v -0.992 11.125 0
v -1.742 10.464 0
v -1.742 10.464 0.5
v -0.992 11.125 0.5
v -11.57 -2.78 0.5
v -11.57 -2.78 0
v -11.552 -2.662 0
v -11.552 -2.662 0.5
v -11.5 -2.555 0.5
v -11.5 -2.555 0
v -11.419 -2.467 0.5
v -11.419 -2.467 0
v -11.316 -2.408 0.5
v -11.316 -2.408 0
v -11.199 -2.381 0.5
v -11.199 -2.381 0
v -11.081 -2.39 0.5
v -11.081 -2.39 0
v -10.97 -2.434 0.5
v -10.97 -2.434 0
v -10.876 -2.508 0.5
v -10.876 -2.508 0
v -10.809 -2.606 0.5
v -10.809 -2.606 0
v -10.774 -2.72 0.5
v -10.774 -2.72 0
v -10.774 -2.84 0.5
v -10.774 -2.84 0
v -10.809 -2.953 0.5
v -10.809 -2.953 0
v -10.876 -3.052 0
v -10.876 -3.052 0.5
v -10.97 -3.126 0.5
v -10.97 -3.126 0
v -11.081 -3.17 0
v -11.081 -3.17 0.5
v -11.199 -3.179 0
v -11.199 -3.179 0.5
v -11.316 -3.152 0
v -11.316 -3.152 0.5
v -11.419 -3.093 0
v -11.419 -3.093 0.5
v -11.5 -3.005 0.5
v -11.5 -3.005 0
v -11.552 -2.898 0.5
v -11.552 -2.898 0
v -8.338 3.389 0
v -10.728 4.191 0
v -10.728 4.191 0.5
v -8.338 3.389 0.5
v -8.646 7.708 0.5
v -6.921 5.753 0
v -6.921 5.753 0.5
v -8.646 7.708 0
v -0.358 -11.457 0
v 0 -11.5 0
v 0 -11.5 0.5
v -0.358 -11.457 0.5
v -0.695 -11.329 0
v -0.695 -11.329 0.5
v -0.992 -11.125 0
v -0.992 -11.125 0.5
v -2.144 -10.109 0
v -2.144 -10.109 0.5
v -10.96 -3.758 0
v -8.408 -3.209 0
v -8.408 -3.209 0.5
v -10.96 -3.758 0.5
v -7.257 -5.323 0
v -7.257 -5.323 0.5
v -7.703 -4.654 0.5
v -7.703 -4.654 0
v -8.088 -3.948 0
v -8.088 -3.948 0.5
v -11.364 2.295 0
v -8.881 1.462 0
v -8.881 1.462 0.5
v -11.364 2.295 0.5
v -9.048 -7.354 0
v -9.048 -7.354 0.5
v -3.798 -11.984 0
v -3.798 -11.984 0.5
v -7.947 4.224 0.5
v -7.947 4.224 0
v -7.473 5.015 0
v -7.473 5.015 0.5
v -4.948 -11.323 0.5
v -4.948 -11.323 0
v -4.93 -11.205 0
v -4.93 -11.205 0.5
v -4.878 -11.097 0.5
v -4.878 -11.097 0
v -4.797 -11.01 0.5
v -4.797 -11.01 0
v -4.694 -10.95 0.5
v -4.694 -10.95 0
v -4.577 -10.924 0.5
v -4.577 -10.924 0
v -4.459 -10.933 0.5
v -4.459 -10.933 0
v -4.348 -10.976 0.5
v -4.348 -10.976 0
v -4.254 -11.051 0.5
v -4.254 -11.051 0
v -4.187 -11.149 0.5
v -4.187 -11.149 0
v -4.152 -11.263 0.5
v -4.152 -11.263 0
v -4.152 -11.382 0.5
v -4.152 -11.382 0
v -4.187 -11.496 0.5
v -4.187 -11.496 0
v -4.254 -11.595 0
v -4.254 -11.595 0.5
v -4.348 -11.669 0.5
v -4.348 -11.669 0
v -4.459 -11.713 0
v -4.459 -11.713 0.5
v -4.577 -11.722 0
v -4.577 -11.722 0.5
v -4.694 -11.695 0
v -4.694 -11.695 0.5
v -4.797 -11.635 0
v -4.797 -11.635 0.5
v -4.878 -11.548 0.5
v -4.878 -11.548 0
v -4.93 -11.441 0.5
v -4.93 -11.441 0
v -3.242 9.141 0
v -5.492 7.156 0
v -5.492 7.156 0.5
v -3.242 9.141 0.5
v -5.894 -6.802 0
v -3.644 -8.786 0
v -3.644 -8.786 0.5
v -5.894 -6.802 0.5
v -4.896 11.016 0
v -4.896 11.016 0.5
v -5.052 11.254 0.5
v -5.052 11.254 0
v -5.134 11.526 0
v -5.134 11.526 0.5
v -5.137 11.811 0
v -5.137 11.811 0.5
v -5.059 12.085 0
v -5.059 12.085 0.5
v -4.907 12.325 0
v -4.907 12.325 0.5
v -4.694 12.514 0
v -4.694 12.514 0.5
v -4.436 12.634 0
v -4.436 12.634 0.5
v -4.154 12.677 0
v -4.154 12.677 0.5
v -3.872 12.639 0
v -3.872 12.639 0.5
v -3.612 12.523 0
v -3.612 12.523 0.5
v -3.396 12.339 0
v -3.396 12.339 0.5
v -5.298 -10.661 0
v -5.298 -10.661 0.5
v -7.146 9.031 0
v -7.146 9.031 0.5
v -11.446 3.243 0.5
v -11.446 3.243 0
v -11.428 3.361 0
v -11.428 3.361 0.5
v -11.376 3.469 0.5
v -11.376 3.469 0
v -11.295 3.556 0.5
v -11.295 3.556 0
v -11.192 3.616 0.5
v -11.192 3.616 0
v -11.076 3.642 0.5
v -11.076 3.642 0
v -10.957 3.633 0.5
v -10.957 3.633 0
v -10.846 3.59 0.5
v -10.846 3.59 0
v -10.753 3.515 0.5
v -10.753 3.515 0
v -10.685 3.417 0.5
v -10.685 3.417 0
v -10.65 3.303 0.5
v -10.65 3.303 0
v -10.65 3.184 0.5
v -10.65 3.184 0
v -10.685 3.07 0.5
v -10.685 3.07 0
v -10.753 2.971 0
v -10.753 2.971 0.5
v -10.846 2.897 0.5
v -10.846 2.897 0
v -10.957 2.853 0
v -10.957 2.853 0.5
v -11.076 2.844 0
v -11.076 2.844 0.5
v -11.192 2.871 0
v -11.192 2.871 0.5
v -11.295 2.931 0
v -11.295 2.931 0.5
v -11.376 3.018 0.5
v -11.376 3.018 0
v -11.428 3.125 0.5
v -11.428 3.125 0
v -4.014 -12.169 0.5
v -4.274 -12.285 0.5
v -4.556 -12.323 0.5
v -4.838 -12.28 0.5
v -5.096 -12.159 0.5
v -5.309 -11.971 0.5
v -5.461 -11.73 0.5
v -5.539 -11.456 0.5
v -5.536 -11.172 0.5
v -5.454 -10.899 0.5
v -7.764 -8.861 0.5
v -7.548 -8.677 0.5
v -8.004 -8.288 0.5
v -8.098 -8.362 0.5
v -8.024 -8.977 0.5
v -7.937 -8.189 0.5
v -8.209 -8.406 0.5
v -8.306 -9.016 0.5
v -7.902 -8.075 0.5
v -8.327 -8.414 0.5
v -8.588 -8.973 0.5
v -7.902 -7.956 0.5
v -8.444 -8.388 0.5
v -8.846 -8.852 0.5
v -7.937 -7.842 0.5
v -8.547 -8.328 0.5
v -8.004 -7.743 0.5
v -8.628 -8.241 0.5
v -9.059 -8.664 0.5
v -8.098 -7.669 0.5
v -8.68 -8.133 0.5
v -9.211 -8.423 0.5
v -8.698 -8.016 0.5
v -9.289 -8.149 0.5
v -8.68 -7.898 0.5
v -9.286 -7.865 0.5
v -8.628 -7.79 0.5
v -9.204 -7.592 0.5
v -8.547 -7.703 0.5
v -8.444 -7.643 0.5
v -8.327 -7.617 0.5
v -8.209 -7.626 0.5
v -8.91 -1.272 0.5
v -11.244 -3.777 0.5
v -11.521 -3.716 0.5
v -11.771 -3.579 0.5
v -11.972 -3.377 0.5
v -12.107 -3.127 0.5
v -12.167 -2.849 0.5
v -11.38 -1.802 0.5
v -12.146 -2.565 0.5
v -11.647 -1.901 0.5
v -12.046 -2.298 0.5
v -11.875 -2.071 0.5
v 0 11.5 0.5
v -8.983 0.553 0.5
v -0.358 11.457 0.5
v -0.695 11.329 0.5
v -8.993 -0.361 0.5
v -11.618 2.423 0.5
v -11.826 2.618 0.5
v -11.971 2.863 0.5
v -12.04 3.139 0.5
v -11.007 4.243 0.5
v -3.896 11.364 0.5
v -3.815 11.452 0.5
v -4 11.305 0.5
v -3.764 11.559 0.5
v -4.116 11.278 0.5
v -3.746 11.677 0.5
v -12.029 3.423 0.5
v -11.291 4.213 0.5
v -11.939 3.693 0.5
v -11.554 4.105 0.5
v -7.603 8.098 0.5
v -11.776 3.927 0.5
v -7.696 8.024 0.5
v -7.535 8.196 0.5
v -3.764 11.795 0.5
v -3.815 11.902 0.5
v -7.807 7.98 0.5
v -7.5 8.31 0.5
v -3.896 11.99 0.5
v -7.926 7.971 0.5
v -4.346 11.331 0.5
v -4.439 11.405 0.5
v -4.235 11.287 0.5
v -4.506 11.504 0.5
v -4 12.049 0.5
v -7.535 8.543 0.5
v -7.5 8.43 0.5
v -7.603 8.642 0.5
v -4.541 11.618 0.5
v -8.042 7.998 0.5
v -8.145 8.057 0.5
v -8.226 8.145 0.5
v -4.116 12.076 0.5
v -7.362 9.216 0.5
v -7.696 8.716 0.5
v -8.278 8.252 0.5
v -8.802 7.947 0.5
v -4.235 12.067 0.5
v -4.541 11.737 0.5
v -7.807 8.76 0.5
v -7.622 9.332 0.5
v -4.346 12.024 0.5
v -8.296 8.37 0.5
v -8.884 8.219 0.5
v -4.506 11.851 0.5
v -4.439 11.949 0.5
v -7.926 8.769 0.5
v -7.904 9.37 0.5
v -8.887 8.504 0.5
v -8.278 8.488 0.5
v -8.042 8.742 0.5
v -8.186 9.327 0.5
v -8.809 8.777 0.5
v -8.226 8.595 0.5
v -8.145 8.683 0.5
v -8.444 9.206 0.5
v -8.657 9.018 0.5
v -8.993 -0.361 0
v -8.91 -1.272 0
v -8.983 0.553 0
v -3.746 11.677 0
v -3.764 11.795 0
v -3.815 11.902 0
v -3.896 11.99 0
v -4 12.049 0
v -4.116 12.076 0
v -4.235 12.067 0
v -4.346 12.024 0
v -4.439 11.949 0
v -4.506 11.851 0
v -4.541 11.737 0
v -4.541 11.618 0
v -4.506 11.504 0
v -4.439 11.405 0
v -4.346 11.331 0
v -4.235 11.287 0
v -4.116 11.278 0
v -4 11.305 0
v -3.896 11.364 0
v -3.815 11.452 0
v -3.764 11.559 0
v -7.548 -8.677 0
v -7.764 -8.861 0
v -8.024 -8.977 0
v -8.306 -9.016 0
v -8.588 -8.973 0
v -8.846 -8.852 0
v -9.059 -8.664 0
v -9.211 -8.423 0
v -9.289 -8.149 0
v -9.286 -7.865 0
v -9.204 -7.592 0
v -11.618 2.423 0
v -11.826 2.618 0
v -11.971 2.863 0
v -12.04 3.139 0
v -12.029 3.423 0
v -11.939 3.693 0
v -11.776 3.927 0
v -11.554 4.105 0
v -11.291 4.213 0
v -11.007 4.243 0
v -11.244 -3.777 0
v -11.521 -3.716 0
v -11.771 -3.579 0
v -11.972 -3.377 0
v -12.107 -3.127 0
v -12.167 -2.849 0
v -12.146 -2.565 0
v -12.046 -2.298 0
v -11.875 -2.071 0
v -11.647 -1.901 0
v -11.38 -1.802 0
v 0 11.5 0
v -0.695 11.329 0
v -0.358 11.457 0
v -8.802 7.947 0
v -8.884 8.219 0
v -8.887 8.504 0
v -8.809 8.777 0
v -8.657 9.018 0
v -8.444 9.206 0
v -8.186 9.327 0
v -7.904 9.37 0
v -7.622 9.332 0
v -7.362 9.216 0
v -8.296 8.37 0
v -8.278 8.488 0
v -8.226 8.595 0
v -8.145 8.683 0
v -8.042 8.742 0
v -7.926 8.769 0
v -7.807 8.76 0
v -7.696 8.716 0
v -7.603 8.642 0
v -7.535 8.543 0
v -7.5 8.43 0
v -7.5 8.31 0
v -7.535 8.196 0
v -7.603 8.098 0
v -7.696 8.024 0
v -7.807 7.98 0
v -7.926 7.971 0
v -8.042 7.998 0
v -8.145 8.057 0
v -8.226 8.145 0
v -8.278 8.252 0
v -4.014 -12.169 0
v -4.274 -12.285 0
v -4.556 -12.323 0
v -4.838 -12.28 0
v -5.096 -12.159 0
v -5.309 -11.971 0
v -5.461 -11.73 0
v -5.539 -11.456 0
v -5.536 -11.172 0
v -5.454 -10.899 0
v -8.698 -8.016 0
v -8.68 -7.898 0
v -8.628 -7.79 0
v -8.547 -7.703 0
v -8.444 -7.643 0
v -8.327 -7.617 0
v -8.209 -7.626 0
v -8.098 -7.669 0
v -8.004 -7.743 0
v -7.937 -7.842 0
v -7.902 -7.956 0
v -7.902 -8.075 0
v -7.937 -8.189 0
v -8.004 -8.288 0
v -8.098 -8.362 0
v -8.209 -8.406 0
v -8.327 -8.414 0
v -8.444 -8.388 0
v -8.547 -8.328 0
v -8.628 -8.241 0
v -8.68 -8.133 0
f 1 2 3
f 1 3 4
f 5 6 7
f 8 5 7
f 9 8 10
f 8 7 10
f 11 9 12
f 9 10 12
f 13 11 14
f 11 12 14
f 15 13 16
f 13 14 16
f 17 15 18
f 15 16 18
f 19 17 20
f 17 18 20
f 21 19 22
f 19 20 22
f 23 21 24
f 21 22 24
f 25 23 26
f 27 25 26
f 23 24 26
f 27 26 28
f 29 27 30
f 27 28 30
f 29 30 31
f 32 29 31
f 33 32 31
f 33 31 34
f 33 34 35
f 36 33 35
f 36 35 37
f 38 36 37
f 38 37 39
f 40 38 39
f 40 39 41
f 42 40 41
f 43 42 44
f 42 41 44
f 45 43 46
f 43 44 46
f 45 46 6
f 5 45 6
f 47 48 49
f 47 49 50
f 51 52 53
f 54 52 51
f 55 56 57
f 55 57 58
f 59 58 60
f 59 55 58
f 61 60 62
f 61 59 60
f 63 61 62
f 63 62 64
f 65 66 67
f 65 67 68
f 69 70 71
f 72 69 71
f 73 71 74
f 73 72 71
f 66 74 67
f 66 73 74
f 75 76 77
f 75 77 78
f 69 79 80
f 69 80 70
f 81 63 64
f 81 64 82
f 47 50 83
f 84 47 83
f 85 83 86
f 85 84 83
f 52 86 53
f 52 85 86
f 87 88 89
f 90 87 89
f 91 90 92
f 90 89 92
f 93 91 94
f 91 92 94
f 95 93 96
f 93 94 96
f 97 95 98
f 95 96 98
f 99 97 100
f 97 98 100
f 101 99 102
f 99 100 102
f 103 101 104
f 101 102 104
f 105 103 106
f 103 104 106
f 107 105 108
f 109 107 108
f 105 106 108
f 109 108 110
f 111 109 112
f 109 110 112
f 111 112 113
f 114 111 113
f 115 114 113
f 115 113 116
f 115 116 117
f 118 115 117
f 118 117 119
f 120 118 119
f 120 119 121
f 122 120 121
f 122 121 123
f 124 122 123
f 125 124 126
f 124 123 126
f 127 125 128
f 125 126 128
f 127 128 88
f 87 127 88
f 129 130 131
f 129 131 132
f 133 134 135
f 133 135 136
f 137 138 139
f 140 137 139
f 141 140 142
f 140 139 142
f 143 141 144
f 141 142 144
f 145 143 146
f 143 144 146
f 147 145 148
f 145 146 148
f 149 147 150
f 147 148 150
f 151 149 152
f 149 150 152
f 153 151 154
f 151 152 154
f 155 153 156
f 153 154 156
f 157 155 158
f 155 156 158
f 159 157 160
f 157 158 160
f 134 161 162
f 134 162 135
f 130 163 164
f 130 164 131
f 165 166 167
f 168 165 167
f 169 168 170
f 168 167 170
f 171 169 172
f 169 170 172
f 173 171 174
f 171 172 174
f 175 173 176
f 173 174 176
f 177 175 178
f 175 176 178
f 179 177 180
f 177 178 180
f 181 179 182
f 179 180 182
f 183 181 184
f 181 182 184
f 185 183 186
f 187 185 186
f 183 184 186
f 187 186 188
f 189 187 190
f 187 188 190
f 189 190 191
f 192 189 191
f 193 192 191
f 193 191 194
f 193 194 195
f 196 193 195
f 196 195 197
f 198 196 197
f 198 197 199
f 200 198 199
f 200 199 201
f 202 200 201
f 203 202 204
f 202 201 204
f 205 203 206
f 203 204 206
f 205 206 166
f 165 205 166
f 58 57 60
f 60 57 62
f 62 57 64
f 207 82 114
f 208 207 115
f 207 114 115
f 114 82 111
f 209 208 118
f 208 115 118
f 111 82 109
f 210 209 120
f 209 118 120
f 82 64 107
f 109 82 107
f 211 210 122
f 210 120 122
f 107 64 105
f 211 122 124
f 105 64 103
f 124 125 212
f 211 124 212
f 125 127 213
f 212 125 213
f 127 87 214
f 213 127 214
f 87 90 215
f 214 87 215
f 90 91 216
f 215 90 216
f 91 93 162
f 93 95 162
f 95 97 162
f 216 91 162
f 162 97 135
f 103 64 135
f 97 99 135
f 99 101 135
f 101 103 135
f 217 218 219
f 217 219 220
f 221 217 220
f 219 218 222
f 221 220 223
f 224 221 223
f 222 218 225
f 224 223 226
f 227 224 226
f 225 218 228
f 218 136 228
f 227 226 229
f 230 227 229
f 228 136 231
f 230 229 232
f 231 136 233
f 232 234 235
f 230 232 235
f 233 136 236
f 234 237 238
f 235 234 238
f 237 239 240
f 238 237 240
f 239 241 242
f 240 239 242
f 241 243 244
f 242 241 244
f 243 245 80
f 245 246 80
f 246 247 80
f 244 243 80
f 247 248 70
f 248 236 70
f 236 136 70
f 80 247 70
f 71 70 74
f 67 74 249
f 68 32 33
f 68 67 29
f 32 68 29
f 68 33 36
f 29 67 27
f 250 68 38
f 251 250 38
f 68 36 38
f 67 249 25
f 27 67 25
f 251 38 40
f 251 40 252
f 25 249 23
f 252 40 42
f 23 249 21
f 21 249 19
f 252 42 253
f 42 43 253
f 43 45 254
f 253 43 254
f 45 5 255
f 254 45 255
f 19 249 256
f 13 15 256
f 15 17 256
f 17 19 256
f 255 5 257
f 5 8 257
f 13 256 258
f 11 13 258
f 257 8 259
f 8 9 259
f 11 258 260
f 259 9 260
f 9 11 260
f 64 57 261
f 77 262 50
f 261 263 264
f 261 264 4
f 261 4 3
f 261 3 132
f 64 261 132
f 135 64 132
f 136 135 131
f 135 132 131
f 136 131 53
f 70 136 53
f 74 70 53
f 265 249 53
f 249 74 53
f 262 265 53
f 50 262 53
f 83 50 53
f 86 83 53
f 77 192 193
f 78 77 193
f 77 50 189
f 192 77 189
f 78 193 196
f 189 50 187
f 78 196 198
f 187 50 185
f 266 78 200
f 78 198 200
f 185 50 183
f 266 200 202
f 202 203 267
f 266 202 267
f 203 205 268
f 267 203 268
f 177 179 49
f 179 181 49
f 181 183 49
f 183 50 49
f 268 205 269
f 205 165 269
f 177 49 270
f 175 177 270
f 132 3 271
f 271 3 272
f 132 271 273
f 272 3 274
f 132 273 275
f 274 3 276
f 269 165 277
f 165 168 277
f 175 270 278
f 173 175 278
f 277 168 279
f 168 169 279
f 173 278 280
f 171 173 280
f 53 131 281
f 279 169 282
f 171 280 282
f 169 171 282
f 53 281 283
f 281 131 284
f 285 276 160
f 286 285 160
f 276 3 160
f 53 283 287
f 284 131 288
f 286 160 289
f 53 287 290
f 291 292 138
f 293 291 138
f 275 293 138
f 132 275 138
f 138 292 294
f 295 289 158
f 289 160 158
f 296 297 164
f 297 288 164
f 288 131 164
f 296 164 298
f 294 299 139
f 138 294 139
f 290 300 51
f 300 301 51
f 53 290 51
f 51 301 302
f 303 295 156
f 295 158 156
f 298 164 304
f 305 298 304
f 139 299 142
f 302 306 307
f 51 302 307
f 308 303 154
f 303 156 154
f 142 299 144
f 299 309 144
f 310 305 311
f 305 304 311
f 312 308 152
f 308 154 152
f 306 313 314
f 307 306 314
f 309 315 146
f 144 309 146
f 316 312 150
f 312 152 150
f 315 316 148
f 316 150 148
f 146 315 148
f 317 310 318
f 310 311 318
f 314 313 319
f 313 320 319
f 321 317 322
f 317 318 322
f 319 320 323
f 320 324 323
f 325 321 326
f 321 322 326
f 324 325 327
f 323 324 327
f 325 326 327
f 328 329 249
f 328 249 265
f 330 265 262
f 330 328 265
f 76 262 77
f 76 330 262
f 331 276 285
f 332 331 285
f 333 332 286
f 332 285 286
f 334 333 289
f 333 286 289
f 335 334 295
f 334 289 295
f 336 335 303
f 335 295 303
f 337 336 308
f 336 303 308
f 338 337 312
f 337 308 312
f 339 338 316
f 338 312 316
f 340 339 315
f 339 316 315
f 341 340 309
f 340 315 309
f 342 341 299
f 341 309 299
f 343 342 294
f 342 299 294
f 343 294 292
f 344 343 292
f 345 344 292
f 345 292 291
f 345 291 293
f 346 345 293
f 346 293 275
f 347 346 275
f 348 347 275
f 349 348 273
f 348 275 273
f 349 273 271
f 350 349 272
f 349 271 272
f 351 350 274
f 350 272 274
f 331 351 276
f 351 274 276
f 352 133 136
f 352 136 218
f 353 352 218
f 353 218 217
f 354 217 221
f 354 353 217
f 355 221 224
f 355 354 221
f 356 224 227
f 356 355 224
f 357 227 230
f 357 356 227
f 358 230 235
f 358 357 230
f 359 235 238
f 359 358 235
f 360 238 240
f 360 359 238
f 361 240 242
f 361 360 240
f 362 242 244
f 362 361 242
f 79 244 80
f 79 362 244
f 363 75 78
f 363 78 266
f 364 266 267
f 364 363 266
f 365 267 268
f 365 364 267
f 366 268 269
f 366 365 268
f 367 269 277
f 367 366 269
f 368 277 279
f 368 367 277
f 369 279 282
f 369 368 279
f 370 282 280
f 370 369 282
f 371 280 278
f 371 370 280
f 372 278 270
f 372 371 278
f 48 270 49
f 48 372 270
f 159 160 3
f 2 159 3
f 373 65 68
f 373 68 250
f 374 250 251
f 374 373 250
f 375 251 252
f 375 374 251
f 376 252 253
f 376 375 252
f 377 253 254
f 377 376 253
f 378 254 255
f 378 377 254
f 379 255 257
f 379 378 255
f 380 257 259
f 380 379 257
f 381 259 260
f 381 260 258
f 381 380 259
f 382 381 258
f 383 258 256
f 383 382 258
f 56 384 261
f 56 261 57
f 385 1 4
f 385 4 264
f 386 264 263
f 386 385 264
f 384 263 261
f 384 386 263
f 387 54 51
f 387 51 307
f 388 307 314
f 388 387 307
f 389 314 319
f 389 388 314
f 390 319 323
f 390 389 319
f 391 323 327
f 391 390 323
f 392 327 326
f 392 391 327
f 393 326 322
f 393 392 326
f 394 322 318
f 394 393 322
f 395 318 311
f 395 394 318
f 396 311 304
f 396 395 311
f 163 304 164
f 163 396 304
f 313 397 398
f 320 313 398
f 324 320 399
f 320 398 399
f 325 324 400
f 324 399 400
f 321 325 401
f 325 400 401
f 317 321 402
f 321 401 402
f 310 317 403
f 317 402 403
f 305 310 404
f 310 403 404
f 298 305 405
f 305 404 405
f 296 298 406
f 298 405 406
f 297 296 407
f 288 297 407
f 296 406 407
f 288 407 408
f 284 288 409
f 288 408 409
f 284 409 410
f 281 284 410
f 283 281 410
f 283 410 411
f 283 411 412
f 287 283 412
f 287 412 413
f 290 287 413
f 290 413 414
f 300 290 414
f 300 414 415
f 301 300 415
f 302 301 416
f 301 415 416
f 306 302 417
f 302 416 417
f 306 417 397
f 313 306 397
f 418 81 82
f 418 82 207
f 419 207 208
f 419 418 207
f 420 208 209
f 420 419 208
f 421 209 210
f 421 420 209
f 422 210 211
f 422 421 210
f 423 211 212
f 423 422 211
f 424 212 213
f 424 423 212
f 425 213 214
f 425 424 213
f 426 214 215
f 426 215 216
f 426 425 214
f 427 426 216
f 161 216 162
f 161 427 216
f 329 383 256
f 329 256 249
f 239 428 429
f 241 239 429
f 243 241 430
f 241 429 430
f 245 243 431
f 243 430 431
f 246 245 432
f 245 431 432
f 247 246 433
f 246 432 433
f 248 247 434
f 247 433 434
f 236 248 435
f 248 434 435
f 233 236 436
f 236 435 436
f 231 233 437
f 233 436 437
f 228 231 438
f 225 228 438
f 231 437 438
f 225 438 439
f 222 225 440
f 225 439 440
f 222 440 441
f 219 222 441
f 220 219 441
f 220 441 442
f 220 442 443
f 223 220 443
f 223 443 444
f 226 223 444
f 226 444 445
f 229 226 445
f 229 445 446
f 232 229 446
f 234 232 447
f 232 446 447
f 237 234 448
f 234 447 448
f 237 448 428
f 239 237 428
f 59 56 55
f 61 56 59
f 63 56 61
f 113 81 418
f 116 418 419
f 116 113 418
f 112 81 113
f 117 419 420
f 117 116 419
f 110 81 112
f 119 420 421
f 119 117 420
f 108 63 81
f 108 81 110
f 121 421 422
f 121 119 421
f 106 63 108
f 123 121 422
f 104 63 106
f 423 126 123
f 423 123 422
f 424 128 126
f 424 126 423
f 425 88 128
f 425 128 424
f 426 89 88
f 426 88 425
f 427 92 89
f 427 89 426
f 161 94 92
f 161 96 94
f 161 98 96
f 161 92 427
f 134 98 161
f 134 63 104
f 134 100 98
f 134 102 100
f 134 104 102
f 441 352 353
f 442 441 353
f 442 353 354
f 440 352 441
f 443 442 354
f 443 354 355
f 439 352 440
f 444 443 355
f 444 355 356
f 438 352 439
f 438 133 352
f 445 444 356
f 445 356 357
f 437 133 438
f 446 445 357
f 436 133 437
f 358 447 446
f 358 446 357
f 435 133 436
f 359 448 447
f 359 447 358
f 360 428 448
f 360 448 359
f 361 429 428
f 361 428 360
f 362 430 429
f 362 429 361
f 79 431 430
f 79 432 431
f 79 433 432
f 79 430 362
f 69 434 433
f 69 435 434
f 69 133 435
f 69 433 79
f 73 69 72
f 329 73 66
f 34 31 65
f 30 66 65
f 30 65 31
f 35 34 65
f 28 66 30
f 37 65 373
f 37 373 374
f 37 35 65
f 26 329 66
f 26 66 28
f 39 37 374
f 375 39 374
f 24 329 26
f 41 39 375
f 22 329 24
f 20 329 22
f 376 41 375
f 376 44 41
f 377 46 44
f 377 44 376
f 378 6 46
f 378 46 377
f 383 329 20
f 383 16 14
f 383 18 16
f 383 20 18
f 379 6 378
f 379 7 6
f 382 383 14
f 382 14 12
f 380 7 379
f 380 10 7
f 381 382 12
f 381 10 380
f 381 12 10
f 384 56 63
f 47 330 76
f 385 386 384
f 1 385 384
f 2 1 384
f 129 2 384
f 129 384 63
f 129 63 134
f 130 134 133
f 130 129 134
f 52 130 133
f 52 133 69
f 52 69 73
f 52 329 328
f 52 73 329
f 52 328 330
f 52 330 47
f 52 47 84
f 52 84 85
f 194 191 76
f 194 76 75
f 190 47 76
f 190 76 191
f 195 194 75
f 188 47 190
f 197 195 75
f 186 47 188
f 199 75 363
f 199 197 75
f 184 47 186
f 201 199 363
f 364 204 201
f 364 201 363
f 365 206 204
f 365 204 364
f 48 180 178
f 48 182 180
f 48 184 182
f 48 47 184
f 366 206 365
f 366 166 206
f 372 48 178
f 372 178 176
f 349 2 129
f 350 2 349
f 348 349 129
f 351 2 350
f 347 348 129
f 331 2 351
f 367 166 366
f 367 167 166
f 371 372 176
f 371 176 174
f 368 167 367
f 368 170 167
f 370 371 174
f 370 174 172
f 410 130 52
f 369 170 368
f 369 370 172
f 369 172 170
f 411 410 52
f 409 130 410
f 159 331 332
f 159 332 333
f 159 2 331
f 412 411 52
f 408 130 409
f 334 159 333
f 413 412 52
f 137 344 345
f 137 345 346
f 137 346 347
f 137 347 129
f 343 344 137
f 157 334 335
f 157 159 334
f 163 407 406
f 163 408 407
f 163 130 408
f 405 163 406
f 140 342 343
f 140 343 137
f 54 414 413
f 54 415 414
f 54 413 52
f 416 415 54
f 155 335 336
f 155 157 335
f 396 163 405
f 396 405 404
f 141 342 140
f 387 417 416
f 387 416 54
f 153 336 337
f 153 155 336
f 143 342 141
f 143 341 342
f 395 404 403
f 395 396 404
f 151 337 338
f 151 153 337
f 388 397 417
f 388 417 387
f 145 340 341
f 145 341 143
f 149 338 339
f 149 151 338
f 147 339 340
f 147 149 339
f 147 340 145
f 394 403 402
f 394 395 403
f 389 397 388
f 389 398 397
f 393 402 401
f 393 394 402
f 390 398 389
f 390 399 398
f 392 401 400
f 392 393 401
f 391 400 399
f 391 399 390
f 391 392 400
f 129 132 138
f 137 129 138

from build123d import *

# Parameters (mm, degrees)
EXTRUDE_1_DEPTH  = 0.5
SKETCH_2_R       = 0.4
EXTRUDE_3_DEPTH  = 0.5
SKETCH_3_R       = 0.4
EXTRUDE_12_DEPTH = 0.5


with BuildPart() as part:
    # Эскиз1 → Вытянуть1 (new body)
    with BuildSketch(Plane.XY):
        with BuildLine():
            Line((0, 11.5), (0, -11.5))
            ThreePointArc((0, -11.5), (-0.530330086, -11.40312152), (-0.992156742, -11.125))
            Line((-0.992156742, -11.125), (-5.95294045, -6.75))
            ThreePointArc((-5.95294045, -6.75), (-9, 0), (-5.95294045, 6.75))
            Line((-5.95294045, 6.75), (-0.992156742, 11.125))
            ThreePointArc((-0.992156742, 11.125), (-0.530330086, 11.40312152), (0, 11.5))
        make_face()
    extrude(amount=EXTRUDE_1_DEPTH)

    # Эскиз2 → Вытянуть3 (add)
    with BuildSketch(Plane.XY.offset(0.5)):
        with BuildLine():
            Line((-3.395751311, 12.338562172), (-1.742156742, 10.463562172))
            Line((-1.742156742, 10.463562172), (-3.242156742, 9.140686517))
            Line((-3.242156742, 9.140686517), (-4.895751311, 11.015686517))
            ThreePointArc((-4.895751311, 11.015686517), (-4.807189139, 12.427124344), (-3.395751311, 12.338562172))
        make_face()
        with Locations((-4.145751311, 11.677124344)):
            Circle(SKETCH_2_R, mode=Mode.SUBTRACT)
    extrude(amount=-EXTRUDE_3_DEPTH)

    # Эскиз3 → Вытянуть12 (add)
    with BuildSketch(Plane(origin=(0, 0, 0), x_dir=(-1, 0, 0), z_dir=(0, 0, -1))):
        with BuildLine():
            Line((7.145751311, 9.031373033), (5.492156742, 7.156373033))
            Line((5.492156742, 7.156373033), (2.144002144, -10.109167839))
            Line((2.144002144, -10.109167839), (3.797596713, -11.984167839))
            ThreePointArc((3.797596713, -11.984167839), (5.209034541, -12.072730011), (5.297596713, -10.661292183))
            Line((5.297596713, -10.661292183), (3.644002144, -8.786292183))
            Line((3.644002144, -8.786292183), (5.894002144, -6.8019787))
            Line((5.894002144, -6.8019787), (7.547596713, -8.6769787))
            ThreePointArc((7.547596713, -8.6769787), (8.959034541, -8.765540872), (9.047596713, -7.354103045))
            Line((9.047596713, -7.354103045), (7.061797178, -5.10241802))
            Line((7.061797178, -5.10241802), (7.50995229, -3.016480181))
            Line((7.50995229, -3.016480181), (10.959544642, -3.757610821))
            ThreePointArc((10.959544642, -3.757610821), (12.14728738, -2.989973414), (11.379649973, -1.802230676))
            Line((11.379649973, -1.802230676), (8.149841538, -1.108319701))
            Line((8.149841538, -1.108319701), (8.688125789, 1.397124189))
            Line((8.688125789, 1.397124189), (11.36395596, 2.295342711))
            ThreePointArc((11.36395596, 2.295342711), (11.993742241, 3.561584883), (10.727500069, 4.191371165))
            Line((10.727500069, 4.191371165), (8.034608294, 3.28742543))
            Line((8.034608294, 3.28742543), (6.559673056, 5.343106973))
            Line((6.559673056, 5.343106973), (8.645751311, 7.708497378))
            ThreePointArc((8.645751311, 7.708497378), (8.557189139, 9.119935206), (7.145751311, 9.031373033))
        make_face()
        with Locations((7.895751311, 8.369935206)):
            Circle(SKETCH_3_R, mode=Mode.SUBTRACT)
        with Locations((11.045728014, 3.243356938)):
            Circle(SKETCH_3_R, mode=Mode.SUBTRACT)
        with Locations((11.169597308, -2.779920749)):
            Circle(SKETCH_3_R, mode=Mode.SUBTRACT)
        with Locations((8.297596713, -8.015540872)):
            Circle(SKETCH_3_R, mode=Mode.SUBTRACT)
        with Locations((4.547596713, -11.322730011)):
            Circle(SKETCH_3_R, mode=Mode.SUBTRACT)
    extrude(amount=-EXTRUDE_12_DEPTH)


solid = part.part
